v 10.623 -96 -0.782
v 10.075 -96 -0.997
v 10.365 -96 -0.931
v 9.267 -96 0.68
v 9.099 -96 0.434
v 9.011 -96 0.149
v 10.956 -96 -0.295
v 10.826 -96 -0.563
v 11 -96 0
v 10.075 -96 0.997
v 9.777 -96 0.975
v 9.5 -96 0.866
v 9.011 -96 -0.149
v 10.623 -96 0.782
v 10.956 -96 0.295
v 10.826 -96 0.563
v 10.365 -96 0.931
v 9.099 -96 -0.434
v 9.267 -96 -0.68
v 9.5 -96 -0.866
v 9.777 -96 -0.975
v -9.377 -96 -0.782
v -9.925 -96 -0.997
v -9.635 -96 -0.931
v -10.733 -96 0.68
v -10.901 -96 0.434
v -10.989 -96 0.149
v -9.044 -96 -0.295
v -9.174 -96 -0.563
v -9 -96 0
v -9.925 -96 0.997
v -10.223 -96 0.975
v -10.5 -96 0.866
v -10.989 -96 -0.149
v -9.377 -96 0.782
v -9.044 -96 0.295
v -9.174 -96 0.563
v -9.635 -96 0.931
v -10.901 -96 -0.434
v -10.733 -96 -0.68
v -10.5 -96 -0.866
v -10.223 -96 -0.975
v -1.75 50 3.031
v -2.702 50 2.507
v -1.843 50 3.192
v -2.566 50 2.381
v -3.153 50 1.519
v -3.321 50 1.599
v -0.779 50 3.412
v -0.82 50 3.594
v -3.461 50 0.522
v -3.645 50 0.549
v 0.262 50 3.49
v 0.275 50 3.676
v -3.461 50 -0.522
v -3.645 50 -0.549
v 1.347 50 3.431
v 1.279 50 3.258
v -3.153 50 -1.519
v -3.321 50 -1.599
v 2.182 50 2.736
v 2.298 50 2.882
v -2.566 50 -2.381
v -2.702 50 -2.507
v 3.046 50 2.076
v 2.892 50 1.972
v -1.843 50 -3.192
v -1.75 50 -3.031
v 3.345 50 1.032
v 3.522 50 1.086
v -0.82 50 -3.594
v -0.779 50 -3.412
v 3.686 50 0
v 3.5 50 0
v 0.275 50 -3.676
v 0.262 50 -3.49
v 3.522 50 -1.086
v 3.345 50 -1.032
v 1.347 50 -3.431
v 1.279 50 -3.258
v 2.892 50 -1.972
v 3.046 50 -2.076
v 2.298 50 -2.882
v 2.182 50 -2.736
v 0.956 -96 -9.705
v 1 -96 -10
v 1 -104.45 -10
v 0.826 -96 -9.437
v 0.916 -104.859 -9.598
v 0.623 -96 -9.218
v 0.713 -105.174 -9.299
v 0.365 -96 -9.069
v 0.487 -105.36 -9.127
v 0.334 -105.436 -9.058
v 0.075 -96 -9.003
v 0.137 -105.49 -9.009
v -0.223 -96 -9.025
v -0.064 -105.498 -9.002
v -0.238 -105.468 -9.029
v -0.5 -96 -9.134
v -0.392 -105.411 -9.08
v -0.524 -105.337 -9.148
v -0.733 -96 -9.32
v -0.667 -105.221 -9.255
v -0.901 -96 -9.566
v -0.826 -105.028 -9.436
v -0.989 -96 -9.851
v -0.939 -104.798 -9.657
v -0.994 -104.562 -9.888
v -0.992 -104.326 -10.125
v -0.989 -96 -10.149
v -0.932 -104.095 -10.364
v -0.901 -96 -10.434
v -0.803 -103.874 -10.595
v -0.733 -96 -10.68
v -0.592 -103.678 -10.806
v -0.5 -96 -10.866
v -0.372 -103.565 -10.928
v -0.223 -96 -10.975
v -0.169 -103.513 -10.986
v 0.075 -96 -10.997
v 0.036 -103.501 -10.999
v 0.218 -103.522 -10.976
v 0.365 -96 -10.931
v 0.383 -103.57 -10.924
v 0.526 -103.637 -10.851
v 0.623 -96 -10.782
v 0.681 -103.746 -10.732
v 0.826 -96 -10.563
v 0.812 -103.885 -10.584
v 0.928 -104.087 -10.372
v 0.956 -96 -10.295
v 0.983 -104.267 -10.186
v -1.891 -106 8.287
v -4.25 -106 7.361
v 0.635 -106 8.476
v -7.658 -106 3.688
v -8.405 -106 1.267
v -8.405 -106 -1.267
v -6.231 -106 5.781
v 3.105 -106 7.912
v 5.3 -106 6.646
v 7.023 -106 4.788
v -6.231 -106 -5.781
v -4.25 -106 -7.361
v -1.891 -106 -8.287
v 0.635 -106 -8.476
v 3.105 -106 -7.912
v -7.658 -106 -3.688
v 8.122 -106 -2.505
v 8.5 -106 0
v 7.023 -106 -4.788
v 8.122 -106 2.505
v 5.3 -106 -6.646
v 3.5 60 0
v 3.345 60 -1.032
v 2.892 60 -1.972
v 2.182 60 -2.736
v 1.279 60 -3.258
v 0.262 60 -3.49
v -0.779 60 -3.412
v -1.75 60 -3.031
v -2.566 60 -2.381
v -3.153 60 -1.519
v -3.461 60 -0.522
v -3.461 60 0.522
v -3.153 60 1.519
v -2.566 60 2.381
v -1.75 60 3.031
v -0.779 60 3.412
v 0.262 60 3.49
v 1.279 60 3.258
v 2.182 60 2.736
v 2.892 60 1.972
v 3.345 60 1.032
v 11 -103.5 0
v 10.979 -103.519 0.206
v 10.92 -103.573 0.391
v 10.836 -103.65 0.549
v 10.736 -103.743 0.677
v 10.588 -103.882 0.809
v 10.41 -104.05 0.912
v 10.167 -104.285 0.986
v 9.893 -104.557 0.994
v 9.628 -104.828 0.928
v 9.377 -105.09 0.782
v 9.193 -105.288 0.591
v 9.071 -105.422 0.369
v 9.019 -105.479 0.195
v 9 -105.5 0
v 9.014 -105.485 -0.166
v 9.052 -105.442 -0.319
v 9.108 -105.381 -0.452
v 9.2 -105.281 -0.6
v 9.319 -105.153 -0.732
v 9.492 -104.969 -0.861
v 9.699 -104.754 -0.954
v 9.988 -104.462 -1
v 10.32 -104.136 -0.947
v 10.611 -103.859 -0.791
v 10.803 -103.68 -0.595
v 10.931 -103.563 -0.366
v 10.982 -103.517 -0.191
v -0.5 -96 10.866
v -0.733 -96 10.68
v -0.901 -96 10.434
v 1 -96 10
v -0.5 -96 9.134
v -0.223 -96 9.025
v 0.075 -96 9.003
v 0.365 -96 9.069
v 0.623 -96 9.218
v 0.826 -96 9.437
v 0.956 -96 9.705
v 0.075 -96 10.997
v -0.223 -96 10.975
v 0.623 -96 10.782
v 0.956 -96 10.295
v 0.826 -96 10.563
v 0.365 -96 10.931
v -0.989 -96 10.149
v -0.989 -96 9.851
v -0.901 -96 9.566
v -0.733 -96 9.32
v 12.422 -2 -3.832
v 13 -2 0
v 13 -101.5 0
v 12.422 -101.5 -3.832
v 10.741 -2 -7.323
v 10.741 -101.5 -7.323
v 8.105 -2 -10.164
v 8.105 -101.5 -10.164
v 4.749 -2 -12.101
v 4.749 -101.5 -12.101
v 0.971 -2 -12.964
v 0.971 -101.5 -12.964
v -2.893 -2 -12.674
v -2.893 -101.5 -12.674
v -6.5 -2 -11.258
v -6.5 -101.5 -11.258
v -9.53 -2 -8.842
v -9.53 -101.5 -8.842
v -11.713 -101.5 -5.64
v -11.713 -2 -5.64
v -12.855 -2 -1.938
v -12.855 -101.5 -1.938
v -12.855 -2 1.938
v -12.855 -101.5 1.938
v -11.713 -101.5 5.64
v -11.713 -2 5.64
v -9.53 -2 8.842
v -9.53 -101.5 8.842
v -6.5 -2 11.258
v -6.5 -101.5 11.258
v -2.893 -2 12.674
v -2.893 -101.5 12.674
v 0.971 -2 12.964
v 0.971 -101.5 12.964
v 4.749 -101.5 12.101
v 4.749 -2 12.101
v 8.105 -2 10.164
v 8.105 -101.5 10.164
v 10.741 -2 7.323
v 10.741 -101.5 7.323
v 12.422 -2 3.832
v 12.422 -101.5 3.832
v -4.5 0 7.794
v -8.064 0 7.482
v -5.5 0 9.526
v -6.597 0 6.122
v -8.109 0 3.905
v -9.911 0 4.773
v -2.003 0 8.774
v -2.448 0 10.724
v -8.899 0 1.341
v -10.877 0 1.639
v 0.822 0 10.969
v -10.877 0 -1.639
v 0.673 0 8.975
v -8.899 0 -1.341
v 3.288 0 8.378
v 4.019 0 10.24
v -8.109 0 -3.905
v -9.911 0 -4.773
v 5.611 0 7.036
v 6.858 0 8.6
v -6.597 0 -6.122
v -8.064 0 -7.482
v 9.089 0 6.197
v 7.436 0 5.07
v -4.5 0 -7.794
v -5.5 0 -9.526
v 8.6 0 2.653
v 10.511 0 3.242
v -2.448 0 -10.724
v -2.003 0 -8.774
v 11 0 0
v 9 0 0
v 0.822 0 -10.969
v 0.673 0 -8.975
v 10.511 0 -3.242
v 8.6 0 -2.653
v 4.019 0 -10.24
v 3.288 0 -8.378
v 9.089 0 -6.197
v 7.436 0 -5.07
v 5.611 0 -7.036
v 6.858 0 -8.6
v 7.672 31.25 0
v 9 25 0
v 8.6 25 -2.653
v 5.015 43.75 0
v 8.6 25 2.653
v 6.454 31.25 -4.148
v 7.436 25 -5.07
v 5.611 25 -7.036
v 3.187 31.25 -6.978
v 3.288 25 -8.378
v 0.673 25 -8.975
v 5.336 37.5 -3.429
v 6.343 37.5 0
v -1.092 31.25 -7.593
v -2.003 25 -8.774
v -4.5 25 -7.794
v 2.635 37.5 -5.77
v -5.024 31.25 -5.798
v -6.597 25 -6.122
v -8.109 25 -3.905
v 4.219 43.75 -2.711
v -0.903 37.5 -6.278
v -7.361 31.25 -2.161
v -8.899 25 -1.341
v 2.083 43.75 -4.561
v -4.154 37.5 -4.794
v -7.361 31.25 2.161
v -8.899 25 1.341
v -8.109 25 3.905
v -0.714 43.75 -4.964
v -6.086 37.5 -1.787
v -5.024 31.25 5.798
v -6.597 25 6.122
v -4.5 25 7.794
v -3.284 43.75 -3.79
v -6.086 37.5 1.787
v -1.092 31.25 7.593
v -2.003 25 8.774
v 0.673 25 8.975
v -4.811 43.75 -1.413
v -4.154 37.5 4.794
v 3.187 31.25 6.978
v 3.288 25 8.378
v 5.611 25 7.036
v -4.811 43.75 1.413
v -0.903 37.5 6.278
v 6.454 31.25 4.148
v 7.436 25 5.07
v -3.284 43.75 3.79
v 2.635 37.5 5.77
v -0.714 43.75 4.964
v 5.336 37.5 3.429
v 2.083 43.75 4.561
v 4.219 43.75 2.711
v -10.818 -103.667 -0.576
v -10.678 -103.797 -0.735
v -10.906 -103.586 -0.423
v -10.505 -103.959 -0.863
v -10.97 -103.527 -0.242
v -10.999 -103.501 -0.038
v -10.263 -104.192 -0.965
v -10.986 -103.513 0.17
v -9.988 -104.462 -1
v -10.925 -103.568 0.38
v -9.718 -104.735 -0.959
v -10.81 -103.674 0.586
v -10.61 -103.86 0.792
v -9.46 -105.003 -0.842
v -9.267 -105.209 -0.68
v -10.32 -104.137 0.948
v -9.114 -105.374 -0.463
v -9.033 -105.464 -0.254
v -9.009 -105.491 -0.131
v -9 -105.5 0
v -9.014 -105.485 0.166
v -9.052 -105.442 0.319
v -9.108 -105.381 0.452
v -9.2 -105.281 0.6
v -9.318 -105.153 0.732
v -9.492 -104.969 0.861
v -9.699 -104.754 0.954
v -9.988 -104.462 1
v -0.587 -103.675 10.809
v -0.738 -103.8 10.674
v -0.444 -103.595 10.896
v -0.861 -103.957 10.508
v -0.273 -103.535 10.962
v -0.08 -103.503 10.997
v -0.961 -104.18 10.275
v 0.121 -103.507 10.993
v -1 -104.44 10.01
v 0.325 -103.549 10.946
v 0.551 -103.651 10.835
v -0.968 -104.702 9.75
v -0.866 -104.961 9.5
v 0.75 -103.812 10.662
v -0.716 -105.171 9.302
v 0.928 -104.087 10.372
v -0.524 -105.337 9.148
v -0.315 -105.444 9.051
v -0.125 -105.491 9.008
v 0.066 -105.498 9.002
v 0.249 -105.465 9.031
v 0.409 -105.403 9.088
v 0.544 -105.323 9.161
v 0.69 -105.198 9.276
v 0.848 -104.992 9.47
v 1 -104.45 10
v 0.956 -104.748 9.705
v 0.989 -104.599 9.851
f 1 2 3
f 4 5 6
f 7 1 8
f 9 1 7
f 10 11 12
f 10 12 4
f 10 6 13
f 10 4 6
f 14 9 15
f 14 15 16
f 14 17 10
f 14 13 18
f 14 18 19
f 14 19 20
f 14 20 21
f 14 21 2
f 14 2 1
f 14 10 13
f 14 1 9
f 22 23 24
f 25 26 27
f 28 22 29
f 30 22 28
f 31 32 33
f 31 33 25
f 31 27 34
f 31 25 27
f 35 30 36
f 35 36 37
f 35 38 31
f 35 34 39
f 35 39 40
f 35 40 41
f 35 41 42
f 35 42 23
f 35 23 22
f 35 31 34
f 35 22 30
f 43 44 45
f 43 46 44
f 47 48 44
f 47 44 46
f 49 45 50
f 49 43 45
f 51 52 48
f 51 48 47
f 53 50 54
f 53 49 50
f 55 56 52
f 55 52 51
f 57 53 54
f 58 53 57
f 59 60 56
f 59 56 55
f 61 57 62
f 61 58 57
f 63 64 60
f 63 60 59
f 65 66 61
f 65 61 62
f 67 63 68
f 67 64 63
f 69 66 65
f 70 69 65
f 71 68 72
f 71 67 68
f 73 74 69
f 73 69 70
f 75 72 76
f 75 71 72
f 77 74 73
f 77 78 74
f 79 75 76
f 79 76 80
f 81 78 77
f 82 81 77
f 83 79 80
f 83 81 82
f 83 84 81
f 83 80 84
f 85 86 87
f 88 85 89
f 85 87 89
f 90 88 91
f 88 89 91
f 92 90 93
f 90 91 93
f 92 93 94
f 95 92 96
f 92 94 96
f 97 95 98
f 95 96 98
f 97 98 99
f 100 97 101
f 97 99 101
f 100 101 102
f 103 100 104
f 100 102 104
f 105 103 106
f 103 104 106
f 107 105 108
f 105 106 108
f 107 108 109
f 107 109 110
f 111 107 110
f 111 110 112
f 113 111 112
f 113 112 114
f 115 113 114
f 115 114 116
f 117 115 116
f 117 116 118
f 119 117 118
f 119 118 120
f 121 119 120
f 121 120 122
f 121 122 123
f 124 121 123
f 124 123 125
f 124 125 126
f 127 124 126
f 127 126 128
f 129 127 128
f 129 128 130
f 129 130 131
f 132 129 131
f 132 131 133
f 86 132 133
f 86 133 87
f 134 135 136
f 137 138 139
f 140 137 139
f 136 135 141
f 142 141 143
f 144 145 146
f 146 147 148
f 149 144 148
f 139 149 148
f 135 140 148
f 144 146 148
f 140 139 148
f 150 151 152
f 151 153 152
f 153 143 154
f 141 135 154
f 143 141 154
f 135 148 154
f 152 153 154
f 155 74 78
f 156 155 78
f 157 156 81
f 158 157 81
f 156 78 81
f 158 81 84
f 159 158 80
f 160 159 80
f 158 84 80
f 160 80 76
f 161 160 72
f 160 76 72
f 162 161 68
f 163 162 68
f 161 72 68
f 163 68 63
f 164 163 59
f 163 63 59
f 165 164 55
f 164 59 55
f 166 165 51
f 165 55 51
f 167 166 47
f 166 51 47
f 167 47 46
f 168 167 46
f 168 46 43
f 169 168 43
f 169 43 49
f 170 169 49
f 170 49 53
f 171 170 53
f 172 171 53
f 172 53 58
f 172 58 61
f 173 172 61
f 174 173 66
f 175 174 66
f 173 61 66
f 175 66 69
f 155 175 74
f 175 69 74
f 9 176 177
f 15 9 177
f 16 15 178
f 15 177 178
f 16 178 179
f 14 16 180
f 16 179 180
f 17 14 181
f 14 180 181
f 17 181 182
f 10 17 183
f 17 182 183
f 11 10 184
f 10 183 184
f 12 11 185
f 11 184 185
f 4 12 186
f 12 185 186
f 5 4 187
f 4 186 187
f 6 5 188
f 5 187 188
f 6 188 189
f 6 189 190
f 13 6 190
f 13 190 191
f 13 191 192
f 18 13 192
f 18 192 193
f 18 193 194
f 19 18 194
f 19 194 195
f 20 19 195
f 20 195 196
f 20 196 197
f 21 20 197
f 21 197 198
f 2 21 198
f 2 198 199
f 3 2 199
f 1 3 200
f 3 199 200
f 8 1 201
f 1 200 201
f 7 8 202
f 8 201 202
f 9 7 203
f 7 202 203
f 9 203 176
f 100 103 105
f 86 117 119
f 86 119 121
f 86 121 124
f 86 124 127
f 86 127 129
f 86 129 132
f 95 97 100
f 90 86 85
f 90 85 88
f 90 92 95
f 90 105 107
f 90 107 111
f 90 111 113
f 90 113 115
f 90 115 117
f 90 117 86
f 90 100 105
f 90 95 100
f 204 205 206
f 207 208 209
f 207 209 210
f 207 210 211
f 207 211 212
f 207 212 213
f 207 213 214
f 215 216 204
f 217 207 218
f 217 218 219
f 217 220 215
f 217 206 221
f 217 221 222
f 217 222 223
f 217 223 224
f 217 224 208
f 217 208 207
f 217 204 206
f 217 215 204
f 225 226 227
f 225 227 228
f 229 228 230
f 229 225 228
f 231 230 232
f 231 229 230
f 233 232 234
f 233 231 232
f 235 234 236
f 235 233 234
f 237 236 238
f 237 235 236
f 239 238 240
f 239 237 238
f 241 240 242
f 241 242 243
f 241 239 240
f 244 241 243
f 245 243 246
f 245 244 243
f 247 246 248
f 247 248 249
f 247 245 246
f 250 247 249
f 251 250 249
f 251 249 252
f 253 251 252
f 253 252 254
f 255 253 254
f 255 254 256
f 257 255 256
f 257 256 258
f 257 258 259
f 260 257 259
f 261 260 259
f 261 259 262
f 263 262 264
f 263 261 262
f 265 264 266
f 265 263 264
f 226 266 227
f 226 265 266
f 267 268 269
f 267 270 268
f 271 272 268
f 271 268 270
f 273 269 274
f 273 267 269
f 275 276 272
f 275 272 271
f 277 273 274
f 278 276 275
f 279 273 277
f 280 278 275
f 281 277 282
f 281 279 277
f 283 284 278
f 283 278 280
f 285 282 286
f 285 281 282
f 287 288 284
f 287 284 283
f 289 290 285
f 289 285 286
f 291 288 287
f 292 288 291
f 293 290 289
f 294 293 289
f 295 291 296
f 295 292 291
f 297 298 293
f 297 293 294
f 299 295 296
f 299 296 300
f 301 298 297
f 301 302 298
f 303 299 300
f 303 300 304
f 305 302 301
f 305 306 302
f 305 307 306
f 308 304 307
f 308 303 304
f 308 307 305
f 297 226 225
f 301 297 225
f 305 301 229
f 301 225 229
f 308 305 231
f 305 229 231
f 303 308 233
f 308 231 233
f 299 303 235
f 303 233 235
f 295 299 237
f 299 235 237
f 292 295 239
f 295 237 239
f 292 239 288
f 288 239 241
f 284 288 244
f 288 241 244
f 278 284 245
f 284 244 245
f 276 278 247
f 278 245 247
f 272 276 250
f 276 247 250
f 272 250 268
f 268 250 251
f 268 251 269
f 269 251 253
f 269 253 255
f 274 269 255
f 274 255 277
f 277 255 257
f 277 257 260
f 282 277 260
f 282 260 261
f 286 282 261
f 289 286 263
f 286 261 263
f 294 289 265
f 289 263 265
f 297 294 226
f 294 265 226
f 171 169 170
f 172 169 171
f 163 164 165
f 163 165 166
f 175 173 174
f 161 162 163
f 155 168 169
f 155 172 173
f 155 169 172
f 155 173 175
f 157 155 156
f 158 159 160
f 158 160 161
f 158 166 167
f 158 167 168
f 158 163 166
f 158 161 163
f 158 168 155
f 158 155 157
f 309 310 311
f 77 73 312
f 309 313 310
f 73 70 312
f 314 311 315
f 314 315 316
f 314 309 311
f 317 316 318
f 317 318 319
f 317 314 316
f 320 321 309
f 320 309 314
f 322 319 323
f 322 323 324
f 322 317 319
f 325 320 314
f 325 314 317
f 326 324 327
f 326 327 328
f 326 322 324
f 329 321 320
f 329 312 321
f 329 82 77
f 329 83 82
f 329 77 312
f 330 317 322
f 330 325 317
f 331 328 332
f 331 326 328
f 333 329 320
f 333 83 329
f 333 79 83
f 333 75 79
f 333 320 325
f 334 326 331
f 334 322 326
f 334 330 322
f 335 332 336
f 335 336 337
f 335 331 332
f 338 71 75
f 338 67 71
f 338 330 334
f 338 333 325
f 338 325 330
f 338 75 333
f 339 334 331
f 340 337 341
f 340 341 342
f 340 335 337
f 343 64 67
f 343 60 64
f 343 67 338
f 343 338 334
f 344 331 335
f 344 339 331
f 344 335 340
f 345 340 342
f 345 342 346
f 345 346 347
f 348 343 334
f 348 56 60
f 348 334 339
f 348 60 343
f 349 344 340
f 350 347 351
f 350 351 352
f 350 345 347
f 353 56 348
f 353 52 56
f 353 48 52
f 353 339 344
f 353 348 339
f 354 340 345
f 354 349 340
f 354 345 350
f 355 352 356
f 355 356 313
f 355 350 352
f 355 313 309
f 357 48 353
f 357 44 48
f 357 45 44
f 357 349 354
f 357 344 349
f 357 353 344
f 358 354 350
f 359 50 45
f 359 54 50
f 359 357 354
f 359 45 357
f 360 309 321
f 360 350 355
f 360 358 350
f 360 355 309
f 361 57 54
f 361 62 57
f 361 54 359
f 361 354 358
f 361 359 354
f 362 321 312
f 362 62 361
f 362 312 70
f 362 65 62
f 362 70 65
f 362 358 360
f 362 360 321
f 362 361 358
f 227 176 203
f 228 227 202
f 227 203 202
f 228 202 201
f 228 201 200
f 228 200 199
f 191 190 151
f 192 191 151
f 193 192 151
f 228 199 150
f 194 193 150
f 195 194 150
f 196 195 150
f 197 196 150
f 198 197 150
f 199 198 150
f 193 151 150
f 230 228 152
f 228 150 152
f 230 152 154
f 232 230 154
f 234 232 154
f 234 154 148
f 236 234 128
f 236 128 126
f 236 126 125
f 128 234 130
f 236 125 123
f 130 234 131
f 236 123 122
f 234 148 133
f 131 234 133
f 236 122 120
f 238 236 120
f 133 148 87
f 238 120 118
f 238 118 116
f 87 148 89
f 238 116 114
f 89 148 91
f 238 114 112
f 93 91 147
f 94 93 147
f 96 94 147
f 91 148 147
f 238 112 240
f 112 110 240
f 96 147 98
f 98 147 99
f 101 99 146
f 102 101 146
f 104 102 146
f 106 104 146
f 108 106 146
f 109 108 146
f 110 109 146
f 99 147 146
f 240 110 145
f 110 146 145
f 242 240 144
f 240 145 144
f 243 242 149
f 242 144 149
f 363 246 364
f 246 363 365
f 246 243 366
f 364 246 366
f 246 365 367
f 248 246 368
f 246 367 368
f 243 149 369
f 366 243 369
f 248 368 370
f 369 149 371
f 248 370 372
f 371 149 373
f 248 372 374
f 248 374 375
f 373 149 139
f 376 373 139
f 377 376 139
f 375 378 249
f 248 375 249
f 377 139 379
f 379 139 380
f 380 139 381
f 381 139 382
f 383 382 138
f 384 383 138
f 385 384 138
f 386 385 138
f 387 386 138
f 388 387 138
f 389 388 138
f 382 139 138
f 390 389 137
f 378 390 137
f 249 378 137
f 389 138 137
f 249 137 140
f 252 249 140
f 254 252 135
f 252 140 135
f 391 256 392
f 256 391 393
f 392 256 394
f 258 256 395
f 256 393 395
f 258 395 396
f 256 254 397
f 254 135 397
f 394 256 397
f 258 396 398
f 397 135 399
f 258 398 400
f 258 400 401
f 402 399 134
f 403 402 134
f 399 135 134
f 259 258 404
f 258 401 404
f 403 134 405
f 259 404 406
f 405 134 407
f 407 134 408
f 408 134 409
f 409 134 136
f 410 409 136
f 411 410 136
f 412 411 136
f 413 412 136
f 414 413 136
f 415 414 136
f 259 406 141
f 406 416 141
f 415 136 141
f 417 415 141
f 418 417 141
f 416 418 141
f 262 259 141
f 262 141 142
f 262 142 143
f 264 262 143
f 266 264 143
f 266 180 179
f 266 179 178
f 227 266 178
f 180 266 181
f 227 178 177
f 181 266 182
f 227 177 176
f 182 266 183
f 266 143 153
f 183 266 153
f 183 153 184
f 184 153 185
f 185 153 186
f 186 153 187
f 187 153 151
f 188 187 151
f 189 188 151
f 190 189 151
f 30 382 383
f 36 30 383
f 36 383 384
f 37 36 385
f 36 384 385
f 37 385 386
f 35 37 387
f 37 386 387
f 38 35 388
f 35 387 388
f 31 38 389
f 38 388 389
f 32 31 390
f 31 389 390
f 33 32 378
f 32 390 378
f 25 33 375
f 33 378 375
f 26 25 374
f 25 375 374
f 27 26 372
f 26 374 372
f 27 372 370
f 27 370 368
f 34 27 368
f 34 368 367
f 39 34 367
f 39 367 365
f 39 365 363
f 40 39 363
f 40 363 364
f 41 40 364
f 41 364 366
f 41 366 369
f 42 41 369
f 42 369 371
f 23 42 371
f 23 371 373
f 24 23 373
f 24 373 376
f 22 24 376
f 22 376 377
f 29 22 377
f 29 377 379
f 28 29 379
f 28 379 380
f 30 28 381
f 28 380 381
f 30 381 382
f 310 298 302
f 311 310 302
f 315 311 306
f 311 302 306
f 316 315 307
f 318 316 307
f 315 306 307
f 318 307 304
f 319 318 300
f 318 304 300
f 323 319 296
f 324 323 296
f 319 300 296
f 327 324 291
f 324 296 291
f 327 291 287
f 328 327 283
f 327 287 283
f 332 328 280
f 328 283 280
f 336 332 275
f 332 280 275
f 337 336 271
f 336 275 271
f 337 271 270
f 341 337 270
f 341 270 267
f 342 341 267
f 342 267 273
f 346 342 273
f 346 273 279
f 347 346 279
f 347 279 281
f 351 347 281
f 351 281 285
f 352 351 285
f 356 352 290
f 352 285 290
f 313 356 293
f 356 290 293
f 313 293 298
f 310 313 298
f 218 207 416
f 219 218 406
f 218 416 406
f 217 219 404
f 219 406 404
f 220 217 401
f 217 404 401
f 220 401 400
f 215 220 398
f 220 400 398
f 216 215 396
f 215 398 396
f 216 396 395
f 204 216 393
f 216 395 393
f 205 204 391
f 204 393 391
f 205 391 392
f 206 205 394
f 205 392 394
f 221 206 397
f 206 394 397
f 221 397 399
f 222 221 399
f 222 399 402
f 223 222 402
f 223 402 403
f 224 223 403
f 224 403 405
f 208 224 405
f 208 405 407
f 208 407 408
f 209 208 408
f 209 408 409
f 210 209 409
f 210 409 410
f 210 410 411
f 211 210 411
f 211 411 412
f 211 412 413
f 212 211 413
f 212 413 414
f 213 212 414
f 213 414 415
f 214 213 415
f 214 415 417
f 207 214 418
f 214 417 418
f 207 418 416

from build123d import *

# Parameters (mm, degrees)
SKETCH1_R           = 9
BOSS_EXTRUDE1_DEPTH = 50
SKETCH1_3_R         = 13
BOSS_EXTRUDE2_DEPTH = 106
SKETCH2_R           = 3.5
BOSS_EXTRUDE3_DEPTH = 10
CHAMFER1_SIZE       = 4.5
CHAMFER2_SIZE       = 25
CHAMFER2_SIZE2      = 5.313914042
SKETCH3_R           = 1
CUT_EXTRUDE1_DEPTH  = 10
CHAMFER3_SIZE       = 2


with BuildPart() as part:
    # Sketch1 → Boss-Extrude1 (new body)
    with BuildSketch(Plane(origin=(0, 0, 0), x_dir=(1, 0, 0), z_dir=(0, 1, 0))):
        Circle(SKETCH1_R)
    extrude(amount=BOSS_EXTRUDE1_DEPTH)

    # Sketch1<3> → Boss-Extrude2 (add)
    with BuildSketch(Plane(origin=(0, 0, 0), x_dir=(1, 0, 0), z_dir=(0, 1, 0))):
        Circle(SKETCH1_3_R)
    extrude(amount=-BOSS_EXTRUDE2_DEPTH)

    # Sketch2 → Boss-Extrude3 (add)
    with BuildSketch(Plane(origin=(0, 50, 0), x_dir=(1, 0, 0), z_dir=(0, 1, 0))):
        Circle(SKETCH2_R)
    extrude(amount=BOSS_EXTRUDE3_DEPTH)

    # Chamfer1
    chamfer1_edges = [part.edges().sort_by_distance(p)[0] for p in [
        (-13, -106, 0),
    ]]
    chamfer(chamfer1_edges, length=CHAMFER1_SIZE)

    # Chamfer2
    chamfer2_edges = [part.edges().sort_by_distance(p)[0] for p in [
        (-9, 50, 0),
    ]]
    chamfer2_side = [part.faces().sort_by_distance(p)[0] for p in [
        (-9, 25, 0),
    ]]
    chamfer(chamfer2_edges, length=CHAMFER2_SIZE, length2=CHAMFER2_SIZE2, reference=chamfer2_side[0])

    # Sketch3 → Cut-Extrude1 (cut)
    with BuildSketch(Plane.XZ.offset(106)):
        with Locations((0, 10)):
            Circle(SKETCH3_R)
        with Locations((10, 0)):
            Circle(SKETCH3_R)
        with Locations((0, -10)):
            Circle(SKETCH3_R)
        with Locations((-10, 0)):
            Circle(SKETCH3_R)
    extrude(amount=-CUT_EXTRUDE1_DEPTH, mode=Mode.SUBTRACT)

    # Chamfer3
    chamfer3_edges = [part.edges().sort_by_distance(p)[0] for p in [
        (-13, 0, 0),
    ]]
    chamfer(chamfer3_edges, length=CHAMFER3_SIZE)


solid = part.part
